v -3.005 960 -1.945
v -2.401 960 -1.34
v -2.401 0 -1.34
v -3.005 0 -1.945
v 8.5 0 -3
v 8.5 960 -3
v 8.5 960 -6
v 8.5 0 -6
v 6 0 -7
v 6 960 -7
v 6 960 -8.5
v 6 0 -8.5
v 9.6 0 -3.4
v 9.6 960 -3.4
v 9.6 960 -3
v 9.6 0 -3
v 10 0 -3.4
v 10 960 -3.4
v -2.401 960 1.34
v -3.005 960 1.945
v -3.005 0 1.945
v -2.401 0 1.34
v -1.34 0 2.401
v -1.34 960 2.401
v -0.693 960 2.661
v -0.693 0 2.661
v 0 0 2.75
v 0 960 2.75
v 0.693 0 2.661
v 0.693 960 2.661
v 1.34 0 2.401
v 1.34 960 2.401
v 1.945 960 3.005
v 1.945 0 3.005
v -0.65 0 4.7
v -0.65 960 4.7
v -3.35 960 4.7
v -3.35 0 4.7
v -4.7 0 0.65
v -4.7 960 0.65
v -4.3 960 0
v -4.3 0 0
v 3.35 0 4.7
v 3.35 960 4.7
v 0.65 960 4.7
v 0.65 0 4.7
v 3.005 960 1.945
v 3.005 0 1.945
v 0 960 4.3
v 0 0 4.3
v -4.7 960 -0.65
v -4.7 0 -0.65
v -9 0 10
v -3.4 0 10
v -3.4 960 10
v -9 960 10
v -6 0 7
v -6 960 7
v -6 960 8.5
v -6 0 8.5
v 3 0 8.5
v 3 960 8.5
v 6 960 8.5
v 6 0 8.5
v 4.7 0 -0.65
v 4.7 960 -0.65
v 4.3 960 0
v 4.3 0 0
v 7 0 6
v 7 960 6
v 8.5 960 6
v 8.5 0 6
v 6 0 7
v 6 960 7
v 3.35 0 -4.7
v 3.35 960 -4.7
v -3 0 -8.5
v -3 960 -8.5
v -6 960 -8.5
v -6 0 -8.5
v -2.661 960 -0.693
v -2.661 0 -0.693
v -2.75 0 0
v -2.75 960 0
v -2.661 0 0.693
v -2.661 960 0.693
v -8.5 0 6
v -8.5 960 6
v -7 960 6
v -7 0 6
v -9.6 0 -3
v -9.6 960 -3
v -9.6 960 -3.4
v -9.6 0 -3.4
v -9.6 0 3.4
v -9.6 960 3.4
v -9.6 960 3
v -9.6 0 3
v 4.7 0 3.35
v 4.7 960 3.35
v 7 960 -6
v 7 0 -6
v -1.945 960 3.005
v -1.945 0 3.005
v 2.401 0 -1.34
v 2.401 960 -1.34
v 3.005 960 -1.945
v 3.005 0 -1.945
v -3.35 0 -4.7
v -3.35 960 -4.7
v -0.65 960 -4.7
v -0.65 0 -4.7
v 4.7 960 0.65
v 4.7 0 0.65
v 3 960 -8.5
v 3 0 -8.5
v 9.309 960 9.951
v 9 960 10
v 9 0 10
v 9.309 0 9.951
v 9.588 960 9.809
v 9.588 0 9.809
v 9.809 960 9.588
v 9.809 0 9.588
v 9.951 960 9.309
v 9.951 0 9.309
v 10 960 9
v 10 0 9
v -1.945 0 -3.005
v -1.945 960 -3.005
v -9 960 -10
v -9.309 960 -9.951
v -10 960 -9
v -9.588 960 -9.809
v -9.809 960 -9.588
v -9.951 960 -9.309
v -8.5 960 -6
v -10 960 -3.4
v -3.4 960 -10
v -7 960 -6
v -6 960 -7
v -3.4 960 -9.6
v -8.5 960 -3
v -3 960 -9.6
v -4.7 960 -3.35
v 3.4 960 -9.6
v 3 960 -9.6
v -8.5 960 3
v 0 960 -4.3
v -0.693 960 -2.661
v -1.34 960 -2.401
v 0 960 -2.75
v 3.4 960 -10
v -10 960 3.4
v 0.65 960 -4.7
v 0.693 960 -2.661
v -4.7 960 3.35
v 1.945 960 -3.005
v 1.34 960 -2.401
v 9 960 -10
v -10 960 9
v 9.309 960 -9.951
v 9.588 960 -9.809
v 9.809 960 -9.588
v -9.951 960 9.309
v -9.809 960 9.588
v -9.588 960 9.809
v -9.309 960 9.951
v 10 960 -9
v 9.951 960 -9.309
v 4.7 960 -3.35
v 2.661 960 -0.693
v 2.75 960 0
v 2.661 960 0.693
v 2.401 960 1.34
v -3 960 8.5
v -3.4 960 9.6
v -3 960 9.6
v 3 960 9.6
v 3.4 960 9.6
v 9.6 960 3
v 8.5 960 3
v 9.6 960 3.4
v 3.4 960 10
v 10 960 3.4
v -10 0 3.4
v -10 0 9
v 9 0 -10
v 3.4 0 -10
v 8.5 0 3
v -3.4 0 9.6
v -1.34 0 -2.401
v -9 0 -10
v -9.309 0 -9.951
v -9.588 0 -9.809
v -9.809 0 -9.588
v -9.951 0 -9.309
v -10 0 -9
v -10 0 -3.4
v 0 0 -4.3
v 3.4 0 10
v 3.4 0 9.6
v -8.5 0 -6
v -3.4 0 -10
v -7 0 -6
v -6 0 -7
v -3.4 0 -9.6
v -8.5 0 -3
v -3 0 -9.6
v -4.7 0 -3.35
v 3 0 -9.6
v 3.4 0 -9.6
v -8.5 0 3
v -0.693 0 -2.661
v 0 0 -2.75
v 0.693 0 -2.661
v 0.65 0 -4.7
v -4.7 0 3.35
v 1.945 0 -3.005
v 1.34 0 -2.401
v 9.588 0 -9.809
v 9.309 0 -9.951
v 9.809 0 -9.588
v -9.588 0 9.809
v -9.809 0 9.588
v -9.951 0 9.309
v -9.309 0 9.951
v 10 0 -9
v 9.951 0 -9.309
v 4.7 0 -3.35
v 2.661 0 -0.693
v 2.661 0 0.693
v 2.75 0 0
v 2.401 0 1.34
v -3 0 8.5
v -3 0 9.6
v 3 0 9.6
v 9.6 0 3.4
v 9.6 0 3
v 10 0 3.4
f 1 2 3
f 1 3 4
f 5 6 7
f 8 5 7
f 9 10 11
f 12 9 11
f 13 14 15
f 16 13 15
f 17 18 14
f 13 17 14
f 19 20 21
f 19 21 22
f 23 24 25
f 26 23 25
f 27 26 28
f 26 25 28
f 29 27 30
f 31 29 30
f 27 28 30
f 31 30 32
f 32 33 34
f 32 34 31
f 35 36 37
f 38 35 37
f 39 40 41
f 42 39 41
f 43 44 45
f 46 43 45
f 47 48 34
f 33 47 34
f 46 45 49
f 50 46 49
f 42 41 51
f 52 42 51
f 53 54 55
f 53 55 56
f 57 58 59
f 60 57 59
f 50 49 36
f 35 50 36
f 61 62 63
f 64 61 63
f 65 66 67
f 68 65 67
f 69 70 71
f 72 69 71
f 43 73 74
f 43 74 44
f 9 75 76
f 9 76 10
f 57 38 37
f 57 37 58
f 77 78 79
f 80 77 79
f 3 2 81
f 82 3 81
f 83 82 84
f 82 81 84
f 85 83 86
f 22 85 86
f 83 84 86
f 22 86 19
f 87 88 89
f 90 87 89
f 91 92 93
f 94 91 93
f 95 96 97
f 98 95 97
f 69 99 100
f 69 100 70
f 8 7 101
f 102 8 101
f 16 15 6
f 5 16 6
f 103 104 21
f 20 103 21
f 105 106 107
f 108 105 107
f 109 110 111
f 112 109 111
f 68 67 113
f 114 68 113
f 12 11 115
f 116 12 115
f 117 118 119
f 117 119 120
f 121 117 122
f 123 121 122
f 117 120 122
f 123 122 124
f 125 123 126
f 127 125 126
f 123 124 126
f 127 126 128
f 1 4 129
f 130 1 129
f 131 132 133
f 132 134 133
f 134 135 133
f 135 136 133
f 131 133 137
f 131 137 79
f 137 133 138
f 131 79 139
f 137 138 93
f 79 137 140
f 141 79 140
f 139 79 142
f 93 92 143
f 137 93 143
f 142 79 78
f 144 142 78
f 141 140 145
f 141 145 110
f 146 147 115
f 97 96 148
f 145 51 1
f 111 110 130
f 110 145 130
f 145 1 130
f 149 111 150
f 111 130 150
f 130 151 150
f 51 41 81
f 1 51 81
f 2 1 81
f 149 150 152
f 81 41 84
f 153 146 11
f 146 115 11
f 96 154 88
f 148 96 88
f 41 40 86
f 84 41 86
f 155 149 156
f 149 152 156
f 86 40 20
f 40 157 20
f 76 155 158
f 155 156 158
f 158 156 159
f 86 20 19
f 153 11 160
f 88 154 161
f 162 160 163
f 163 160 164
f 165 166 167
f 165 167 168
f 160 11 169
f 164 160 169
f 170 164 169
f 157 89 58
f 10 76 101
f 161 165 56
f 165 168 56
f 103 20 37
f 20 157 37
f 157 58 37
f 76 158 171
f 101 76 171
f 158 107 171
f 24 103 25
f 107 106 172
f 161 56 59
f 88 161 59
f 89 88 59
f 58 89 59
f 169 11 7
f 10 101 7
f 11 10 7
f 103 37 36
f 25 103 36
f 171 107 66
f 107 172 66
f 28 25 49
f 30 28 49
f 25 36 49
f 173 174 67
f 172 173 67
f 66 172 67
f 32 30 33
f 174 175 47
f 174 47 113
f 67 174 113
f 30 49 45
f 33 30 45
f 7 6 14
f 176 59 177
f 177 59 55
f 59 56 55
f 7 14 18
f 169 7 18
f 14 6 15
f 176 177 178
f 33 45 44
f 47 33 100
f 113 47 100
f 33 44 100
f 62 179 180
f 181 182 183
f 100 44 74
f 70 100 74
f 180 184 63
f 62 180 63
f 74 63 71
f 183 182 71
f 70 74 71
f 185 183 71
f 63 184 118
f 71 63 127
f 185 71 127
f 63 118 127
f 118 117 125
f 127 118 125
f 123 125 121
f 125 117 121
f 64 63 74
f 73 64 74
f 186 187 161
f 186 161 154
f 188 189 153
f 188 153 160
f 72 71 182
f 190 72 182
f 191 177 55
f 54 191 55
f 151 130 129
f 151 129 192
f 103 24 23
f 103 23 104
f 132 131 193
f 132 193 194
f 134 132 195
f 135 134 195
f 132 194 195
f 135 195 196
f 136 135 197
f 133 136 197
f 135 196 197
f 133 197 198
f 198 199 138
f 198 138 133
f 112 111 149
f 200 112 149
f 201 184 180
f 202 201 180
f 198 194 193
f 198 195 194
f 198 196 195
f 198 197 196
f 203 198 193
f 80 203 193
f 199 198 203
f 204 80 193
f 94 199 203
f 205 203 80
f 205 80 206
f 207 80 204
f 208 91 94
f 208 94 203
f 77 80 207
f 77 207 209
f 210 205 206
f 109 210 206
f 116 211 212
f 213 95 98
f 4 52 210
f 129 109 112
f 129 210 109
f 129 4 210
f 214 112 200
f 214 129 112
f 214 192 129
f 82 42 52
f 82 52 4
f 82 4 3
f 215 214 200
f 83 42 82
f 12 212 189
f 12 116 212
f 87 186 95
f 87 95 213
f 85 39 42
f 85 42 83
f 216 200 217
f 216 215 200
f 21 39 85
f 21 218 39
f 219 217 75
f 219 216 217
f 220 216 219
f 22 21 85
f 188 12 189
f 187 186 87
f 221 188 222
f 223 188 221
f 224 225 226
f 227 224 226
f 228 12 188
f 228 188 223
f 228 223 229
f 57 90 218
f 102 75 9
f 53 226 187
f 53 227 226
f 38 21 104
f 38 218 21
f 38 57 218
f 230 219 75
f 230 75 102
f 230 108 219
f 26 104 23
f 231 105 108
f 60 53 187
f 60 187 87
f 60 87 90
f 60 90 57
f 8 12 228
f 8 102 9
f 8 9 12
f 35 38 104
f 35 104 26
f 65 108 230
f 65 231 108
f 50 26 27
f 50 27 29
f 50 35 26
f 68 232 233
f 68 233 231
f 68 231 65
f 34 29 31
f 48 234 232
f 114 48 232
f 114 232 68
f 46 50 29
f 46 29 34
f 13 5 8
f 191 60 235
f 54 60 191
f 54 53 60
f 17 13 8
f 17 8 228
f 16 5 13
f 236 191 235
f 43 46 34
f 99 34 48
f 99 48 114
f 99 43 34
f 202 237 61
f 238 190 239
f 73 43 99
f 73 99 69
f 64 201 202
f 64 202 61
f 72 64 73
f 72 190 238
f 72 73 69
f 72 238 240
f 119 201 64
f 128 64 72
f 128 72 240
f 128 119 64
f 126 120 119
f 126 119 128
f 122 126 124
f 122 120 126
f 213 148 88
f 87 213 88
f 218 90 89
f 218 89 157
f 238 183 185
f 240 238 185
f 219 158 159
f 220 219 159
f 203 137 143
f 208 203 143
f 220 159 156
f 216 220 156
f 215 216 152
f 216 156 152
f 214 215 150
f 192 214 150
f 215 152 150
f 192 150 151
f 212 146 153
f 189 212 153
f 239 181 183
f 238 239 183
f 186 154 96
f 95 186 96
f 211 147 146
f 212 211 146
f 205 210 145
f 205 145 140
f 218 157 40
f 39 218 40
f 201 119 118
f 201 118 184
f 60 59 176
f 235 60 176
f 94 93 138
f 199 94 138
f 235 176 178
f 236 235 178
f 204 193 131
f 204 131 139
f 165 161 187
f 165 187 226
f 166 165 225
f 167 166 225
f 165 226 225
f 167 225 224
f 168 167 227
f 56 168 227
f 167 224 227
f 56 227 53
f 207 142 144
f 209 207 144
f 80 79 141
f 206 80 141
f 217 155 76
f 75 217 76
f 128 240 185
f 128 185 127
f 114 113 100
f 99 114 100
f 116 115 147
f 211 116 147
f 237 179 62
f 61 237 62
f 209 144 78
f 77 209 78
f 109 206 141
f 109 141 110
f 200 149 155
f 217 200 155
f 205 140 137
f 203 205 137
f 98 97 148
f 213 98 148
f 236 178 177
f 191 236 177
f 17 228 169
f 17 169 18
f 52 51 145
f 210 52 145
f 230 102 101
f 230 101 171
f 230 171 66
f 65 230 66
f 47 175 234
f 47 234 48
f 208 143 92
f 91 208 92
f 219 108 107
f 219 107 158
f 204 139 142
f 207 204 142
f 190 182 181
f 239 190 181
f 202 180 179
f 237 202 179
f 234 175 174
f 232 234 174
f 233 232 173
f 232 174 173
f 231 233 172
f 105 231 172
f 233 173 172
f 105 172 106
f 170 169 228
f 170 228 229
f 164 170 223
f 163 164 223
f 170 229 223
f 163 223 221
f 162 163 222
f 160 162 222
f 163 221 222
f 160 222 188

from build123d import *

# Parameters (mm, degrees)
PAD_DEPTH          = 960
POCKET_DEPTH       = 960
POLARPATTERN_COUNT = 4
POCKET001_DEPTH    = 960


with BuildPart() as part:
    # Sketch → Pad (new body)
    with BuildSketch(Plane(origin=(0, 0, 0), x_dir=(-1, 0, 0), z_dir=(0, 1, 0))):
        with BuildLine():
            Line((-9, 10), (9, 10))
            ThreePointArc((10, 9), (9.707107, 9.707107), (9, 10))
            Line((10, 9), (10, -9))
            ThreePointArc((9, -10), (9.707107, -9.707107), (10, -9))
            Line((9, -10), (-9, -10))
            ThreePointArc((-10, -9), (-9.707107, -9.707107), (-9, -10))
            Line((-10, -9), (-10, 9))
            ThreePointArc((-9, 10), (-9.707107, 9.707107), (-10, 9))
        make_face()
    extrude(amount=PAD_DEPTH)

    # Sketch001 (on Face10 of Pad) → Pocket (cut)
    with BuildSketch(Plane(origin=(0, 960, 0), x_dir=(1, 0, 0), z_dir=(0, 1, 0))):
        Polygon((-3.4, 10), (-3.4, 9.6), (-3, 9.6), (-3, 8.5), (-6, 8.5), (-6, 7), (-3.35, 4.7), (-0.65, 4.7), (0, 4.3), (0.65, 4.7), (3.35, 4.7), (6, 7), (6, 8.5), (3, 8.5), (3, 9.6), (3.4, 9.6), (3.4, 10), align=None)
    pocket = extrude(amount=-POCKET_DEPTH, mode=Mode.SUBTRACT)

    # PolarPattern: Pocket ×4 about axis
    polarpattern_axis = Axis((0, 960, 0), (0, 1, 0))
    for i in range(1, POLARPATTERN_COUNT):
        add(pocket.rotate(polarpattern_axis, i * 360 / POLARPATTERN_COUNT), mode=Mode.SUBTRACT)

    # Sketch002 (on Face4 of PolarPattern) → Pocket001 (cut)
    with BuildSketch(Plane(origin=(0, 960, 0), x_dir=(1, 0, 0), z_dir=(0, 1, 0))):
        with BuildLine():
            ThreePointArc((1.340499, 2.401159), (0, 2.75), (-1.340499, 2.401159))
            Line((-1.944544, 3.005204), (-1.340499, 2.401159))
            Line((-3.005204, 1.944544), (-1.944544, 3.005204))
            Line((-2.401159, 1.340499), (-3.005204, 1.944544))
            ThreePointArc((-2.401159, 1.340499), (-2.75, 0), (-2.401159, -1.340499))
            Line((-3.005204, -1.944544), (-2.401159, -1.340499))
            Line((-1.944544, -3.005204), (-3.005204, -1.944544))
            Line((-1.340499, -2.401159), (-1.944544, -3.005204))
            ThreePointArc((-1.340499, -2.401159), (0, -2.75), (1.340499, -2.401159))
            Line((1.944544, -3.005204), (1.340499, -2.401159))
            Line((3.005204, -1.944544), (1.944544, -3.005204))
            Line((2.401159, -1.340499), (3.005204, -1.944544))
            ThreePointArc((2.401159, -1.340499), (2.75, 0), (2.401159, 1.340499))
            Line((2.401159, 1.340499), (3.005204, 1.944544))
            Line((3.005204, 1.944544), (1.944544, 3.005204))
            Line((1.944544, 3.005204), (1.340499, 2.401159))
        make_face()
    extrude(amount=-POCKET001_DEPTH, mode=Mode.SUBTRACT)


solid = part.part
